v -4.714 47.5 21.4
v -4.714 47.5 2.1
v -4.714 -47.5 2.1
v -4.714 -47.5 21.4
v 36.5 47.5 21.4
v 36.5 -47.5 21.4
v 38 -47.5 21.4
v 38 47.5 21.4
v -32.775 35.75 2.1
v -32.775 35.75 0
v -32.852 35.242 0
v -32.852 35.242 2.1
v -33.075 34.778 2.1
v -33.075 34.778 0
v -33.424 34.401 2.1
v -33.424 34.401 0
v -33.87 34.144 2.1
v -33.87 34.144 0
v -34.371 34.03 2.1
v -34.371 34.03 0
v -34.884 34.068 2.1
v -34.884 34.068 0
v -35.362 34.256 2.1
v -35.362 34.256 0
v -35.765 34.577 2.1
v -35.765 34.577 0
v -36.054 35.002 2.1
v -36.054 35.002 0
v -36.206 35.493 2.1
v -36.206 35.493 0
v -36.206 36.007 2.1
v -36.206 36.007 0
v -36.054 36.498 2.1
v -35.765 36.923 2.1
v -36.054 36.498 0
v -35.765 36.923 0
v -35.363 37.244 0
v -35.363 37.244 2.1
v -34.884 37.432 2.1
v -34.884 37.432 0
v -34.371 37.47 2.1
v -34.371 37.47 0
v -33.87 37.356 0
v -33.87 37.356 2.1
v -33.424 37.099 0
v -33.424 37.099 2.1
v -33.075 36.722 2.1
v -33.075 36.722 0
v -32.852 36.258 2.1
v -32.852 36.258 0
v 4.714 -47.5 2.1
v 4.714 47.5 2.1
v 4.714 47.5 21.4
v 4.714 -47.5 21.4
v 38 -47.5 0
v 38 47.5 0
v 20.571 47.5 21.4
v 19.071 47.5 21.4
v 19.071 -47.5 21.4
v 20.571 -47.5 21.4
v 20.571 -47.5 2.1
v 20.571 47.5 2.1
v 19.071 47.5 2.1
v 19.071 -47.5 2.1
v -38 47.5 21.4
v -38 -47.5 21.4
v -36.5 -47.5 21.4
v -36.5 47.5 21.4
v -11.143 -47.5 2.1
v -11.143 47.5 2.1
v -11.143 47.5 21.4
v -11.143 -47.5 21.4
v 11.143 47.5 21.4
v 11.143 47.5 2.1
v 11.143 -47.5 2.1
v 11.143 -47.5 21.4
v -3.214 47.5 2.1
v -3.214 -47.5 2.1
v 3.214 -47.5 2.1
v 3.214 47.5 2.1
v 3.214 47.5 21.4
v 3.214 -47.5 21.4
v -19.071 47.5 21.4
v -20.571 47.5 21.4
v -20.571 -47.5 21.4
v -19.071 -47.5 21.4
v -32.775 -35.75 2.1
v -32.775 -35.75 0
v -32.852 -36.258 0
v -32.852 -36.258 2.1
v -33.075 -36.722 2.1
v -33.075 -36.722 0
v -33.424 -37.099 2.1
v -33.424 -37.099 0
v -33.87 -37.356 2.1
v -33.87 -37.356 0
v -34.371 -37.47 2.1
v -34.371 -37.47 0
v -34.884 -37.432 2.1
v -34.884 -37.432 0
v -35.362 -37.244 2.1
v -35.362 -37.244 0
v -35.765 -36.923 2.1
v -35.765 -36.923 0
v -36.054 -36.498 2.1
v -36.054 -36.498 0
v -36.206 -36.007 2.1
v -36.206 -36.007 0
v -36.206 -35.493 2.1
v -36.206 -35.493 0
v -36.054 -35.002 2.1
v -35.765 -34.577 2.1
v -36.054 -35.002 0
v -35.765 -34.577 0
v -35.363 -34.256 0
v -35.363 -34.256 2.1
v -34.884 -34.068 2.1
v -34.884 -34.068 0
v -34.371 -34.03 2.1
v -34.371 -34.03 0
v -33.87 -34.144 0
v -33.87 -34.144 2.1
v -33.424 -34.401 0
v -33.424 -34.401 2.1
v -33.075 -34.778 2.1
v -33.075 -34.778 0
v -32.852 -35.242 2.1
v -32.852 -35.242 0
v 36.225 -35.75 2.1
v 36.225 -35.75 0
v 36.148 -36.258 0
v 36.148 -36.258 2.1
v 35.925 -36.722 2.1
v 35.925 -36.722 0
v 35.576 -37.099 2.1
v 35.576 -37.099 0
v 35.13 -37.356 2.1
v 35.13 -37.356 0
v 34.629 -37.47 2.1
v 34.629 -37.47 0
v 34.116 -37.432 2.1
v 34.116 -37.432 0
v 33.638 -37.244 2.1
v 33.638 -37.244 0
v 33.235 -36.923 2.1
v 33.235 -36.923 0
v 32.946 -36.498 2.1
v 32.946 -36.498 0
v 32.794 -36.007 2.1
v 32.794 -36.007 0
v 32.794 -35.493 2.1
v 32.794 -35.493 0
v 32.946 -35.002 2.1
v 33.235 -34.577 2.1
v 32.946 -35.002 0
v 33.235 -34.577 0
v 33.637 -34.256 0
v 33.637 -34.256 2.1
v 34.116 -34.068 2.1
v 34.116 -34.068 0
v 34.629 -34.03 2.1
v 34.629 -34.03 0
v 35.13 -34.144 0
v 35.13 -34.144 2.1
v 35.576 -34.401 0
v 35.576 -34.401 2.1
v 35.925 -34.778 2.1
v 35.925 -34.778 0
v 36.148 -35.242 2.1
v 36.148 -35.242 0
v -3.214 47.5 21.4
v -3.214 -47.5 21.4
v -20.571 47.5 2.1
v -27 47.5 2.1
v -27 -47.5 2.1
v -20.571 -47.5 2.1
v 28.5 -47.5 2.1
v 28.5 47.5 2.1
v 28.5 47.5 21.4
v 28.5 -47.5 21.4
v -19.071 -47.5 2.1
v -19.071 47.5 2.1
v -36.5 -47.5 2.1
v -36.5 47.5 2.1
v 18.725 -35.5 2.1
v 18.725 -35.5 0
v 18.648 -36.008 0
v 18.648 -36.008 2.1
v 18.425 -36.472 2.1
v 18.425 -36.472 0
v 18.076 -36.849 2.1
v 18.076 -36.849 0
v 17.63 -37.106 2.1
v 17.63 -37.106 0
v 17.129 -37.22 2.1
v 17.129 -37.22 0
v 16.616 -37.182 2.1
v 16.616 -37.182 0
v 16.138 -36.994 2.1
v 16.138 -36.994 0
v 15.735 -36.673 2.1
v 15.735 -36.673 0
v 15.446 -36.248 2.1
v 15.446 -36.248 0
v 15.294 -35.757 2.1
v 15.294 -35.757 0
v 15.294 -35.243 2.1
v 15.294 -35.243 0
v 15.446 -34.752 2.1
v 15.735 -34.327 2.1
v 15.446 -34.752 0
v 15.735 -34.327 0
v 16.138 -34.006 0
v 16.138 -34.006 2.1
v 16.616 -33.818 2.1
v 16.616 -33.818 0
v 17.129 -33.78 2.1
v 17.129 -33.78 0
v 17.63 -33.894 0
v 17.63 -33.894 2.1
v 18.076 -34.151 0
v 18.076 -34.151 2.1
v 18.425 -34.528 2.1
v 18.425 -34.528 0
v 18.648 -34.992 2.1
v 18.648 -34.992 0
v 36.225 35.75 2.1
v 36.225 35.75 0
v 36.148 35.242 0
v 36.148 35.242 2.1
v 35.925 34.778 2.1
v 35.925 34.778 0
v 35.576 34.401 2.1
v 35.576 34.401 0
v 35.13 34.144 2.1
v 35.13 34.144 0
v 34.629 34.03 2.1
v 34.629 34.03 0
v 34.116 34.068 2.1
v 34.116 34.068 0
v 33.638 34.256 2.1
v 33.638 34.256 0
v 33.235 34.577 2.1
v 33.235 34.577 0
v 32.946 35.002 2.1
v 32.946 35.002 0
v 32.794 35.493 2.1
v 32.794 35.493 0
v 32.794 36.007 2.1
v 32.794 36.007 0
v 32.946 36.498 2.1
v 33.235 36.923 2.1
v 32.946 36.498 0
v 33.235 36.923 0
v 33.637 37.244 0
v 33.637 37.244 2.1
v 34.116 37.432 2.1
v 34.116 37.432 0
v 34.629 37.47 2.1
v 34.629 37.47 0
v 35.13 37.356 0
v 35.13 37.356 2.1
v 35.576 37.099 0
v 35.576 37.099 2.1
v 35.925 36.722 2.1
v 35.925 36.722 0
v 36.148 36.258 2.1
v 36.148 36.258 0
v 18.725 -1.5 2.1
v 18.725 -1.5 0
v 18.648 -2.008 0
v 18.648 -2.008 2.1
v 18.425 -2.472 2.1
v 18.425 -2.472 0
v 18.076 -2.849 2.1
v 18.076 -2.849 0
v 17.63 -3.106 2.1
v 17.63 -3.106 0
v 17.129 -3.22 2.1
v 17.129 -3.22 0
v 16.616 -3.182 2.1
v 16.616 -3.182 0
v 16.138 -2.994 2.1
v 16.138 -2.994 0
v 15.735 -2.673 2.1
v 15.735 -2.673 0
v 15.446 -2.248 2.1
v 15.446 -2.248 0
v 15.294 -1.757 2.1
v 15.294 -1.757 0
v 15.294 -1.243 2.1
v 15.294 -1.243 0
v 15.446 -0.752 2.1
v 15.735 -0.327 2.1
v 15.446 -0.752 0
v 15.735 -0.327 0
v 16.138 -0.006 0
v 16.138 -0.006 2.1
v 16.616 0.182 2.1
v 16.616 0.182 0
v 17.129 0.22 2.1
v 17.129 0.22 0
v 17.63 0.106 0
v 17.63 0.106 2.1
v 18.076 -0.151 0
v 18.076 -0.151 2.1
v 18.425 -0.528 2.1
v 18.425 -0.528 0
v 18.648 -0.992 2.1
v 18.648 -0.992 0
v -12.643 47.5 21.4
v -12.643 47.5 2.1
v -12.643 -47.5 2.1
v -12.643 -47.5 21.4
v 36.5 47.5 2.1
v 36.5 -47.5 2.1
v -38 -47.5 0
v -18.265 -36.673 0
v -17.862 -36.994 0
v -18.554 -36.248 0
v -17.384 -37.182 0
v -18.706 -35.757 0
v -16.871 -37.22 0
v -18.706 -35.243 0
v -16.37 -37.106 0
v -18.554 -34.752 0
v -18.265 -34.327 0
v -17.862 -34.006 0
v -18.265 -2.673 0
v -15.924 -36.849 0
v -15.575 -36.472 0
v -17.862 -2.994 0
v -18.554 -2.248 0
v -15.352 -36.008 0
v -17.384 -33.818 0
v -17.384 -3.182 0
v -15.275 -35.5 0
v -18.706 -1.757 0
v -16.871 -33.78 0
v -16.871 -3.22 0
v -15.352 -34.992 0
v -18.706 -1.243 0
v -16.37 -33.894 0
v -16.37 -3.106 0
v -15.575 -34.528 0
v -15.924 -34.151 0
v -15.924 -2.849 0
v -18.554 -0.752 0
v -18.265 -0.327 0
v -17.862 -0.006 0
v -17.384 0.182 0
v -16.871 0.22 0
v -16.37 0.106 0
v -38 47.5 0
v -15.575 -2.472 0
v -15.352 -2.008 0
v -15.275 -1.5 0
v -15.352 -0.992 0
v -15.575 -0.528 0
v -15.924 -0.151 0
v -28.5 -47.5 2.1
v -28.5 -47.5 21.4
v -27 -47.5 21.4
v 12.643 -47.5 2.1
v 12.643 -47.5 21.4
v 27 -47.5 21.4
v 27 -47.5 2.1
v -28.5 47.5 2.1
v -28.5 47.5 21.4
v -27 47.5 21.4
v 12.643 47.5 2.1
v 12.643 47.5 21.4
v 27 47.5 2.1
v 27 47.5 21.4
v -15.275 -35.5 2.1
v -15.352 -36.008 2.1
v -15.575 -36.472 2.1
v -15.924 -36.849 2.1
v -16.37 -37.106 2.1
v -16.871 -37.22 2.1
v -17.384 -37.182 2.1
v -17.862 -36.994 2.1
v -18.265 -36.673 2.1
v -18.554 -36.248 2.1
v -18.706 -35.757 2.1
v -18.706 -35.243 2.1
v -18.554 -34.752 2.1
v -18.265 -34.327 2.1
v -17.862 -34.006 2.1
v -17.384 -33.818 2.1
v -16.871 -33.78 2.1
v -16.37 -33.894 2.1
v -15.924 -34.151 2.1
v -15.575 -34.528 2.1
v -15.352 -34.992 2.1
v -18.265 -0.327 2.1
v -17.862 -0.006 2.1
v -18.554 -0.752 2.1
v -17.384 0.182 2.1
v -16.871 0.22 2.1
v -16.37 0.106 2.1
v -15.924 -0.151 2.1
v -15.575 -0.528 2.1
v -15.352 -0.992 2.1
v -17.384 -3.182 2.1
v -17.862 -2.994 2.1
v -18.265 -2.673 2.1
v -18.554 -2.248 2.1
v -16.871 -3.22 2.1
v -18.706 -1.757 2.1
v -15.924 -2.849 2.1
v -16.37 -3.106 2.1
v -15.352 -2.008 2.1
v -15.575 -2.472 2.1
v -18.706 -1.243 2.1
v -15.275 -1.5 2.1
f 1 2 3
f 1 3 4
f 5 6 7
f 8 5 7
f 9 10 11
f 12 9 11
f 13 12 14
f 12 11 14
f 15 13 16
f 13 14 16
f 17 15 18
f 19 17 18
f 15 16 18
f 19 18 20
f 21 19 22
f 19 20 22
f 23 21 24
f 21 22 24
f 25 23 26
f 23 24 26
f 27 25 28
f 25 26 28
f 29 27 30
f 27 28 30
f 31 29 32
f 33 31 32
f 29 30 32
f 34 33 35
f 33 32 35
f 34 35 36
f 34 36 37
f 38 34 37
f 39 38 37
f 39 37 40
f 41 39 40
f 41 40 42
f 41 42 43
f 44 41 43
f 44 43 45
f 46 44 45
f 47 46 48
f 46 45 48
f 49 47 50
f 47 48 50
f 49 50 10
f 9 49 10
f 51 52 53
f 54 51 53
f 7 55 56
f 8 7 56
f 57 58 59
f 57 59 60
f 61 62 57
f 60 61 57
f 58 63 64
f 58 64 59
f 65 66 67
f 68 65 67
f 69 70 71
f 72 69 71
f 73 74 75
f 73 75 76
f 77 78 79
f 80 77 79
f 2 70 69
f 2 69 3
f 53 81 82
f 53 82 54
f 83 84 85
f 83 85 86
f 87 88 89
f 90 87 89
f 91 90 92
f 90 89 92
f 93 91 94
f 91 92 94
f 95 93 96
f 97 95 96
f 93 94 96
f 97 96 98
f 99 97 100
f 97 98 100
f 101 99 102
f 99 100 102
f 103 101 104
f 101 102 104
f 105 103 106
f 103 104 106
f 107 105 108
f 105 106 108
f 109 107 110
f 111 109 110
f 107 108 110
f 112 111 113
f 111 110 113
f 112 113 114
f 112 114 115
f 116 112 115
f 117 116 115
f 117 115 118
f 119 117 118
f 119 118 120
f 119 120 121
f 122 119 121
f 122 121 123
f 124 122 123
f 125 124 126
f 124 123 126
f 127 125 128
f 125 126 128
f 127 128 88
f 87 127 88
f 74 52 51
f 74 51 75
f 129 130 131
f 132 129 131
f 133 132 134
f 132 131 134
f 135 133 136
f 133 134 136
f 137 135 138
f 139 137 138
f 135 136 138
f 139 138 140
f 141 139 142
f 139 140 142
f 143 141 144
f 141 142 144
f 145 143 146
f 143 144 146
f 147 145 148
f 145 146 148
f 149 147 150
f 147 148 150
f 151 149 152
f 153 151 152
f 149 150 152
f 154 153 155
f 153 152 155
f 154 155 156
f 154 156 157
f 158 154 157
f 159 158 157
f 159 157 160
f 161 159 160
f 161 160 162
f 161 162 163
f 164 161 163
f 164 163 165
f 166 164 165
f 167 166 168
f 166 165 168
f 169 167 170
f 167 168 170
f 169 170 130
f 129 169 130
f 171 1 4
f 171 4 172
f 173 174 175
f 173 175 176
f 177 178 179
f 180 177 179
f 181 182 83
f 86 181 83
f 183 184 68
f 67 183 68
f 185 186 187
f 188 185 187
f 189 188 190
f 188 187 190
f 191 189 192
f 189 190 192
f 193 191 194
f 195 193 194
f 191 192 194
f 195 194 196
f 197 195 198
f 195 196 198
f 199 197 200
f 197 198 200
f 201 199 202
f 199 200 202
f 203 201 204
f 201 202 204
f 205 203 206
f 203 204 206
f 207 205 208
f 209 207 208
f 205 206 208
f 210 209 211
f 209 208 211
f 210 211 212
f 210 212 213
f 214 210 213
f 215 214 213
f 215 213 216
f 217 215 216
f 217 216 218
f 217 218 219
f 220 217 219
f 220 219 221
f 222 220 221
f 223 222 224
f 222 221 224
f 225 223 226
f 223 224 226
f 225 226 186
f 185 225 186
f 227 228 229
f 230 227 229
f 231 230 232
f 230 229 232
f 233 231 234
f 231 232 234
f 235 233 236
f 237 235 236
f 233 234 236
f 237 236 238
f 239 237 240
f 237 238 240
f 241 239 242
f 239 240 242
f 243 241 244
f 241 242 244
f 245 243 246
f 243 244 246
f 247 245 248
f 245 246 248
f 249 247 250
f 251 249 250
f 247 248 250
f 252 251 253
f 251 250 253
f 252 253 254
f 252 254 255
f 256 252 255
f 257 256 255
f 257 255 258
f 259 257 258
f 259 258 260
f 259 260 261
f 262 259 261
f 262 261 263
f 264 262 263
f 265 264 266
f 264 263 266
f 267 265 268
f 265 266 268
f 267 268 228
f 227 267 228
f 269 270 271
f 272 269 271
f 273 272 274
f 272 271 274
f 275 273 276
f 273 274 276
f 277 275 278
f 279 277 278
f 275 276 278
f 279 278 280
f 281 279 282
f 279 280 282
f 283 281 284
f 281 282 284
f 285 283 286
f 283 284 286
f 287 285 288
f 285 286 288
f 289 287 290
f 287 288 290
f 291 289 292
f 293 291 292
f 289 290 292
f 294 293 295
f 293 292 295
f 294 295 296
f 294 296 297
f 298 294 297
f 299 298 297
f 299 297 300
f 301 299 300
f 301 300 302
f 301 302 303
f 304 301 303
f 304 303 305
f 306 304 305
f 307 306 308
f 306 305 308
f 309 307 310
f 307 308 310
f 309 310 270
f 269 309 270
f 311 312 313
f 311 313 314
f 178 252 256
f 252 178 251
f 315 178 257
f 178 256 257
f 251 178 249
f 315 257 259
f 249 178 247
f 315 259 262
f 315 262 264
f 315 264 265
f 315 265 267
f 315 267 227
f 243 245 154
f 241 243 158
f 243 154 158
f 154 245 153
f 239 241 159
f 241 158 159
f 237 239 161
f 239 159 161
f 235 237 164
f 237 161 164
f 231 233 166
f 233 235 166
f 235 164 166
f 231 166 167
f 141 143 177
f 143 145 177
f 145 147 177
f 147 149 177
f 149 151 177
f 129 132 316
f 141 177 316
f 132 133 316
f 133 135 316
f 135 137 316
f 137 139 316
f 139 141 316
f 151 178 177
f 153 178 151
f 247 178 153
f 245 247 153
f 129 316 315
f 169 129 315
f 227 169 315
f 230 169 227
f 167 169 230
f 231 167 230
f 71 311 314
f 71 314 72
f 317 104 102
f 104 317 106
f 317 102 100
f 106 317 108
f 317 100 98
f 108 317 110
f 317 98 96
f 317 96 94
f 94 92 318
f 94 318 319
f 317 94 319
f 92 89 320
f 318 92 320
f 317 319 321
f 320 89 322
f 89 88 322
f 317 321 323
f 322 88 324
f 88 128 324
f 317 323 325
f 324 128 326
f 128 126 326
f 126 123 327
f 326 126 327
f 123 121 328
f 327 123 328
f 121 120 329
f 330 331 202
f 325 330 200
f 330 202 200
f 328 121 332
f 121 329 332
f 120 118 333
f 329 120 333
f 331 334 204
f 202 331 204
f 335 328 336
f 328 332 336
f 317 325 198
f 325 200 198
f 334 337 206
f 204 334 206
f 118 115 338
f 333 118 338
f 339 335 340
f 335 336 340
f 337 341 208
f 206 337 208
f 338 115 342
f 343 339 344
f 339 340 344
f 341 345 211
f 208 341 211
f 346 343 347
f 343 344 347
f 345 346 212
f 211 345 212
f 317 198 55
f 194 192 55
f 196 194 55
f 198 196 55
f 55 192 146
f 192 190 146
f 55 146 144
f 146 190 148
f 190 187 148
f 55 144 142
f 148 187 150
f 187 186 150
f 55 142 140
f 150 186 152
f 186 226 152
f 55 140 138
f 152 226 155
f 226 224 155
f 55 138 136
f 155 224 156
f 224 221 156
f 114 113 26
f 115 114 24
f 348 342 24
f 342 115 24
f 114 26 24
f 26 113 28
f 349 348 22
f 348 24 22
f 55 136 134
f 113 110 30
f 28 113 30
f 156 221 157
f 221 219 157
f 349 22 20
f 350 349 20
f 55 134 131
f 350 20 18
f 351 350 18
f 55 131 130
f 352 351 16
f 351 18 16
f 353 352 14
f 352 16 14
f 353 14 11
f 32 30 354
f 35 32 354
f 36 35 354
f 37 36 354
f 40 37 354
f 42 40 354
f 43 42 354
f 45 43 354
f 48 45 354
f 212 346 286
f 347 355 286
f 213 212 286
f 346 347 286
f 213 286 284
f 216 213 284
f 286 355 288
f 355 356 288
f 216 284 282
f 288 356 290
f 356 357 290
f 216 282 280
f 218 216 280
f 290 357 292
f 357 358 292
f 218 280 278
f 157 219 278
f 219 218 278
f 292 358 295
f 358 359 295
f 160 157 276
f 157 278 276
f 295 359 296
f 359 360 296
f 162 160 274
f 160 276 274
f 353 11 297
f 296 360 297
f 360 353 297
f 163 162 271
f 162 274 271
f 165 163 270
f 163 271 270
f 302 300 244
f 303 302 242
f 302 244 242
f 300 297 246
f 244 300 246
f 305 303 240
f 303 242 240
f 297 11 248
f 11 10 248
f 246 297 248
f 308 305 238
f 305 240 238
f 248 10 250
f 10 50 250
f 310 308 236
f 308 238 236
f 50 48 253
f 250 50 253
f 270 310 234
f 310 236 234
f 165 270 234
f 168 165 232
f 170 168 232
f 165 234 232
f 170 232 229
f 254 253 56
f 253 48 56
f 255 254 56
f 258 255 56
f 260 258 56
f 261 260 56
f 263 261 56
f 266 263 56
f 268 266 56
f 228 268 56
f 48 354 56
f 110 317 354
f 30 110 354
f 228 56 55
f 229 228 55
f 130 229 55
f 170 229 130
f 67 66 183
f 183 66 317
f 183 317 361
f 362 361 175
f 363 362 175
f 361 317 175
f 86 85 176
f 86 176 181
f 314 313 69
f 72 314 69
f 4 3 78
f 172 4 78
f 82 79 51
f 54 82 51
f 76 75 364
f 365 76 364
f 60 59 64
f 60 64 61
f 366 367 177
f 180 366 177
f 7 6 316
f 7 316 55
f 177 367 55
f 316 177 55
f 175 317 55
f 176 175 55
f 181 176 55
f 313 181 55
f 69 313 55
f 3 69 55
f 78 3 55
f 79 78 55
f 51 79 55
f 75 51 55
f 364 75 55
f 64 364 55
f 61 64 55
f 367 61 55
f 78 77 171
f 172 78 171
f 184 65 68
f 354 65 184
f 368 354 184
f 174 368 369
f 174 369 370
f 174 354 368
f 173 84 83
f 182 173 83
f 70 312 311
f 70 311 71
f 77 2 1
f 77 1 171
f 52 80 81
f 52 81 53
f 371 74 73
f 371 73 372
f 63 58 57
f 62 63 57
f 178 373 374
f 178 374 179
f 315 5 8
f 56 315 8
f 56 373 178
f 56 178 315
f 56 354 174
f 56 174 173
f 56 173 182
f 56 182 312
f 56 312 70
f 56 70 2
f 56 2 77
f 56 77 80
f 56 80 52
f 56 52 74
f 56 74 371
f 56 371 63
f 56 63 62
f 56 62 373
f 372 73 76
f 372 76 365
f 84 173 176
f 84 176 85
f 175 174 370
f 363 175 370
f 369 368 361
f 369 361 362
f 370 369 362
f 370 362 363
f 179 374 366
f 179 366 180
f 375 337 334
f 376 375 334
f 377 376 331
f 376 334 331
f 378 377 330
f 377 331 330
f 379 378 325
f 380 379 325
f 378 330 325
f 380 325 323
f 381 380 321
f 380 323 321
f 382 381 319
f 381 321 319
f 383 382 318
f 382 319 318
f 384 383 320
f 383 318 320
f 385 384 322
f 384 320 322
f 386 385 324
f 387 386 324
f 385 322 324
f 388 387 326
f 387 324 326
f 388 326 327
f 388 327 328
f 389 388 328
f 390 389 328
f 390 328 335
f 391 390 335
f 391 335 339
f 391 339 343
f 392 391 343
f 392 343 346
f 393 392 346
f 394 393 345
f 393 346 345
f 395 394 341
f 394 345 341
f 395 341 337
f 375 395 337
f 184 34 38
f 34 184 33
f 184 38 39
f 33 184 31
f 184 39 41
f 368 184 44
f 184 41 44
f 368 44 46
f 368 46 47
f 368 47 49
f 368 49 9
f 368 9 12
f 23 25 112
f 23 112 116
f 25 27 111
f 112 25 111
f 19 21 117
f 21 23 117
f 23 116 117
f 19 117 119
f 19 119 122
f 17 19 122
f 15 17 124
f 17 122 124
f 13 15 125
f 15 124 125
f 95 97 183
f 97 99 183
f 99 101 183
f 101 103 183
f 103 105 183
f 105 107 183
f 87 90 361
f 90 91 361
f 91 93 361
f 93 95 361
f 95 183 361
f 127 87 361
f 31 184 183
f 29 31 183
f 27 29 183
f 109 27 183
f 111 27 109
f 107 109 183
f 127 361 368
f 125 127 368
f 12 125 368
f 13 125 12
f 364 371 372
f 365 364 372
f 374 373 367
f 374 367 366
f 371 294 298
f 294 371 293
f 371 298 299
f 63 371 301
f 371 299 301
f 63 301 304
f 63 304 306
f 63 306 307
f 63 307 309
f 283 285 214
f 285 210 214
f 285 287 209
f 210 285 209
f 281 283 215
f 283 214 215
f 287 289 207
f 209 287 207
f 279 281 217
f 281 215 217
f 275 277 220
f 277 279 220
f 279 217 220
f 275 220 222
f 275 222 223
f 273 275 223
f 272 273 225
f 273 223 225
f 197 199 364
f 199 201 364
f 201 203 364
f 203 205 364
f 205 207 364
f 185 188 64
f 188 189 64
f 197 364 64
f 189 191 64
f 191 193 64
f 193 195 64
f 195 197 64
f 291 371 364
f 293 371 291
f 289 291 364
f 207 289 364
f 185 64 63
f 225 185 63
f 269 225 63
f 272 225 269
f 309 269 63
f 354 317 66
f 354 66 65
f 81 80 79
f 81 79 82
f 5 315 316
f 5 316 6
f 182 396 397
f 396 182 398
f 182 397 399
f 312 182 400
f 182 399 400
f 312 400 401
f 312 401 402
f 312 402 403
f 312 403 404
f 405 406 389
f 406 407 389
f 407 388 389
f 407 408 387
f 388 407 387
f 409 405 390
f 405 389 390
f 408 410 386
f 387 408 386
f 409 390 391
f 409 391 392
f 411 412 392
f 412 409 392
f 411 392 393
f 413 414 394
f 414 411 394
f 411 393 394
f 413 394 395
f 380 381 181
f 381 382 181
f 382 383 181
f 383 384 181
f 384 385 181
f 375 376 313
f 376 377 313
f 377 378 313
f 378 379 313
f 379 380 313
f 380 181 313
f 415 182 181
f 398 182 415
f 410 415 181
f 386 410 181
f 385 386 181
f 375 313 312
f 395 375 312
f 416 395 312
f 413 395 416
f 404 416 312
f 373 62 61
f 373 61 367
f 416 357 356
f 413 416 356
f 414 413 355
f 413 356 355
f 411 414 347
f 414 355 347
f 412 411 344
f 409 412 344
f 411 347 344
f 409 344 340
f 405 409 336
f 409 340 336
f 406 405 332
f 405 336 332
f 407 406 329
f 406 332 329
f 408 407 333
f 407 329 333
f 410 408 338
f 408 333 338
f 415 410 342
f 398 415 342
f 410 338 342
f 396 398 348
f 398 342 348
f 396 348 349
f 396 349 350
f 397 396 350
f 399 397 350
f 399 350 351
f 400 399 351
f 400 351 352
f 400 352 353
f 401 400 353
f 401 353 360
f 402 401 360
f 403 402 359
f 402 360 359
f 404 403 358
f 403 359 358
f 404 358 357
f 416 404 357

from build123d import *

# Parameters (mm, degrees)
F0_W     = 76
F0_H     = 95
F1_DEPTH = 21.4
F2_W     = 8
F2_H     = 19.3
F2_W_2   = 6.428571
F2_W_3   = 6.428572
F3_DEPTH = 95
F4_R     = 1.725
F5_DEPTH = 2.1


with BuildPart() as f1:
    # F0 (on Top) → F1 (new body)
    with BuildSketch(Plane.XY):
        Rectangle(F0_W, F0_H)
    extrude(amount=F1_DEPTH)

    # F2 (on face) → F3 (cut, through all)
    with BuildSketch(Plane.XZ.offset(47.5)):
        with Locations((-32.5, 11.75)):
            Rectangle(F2_W, F2_H)
        with Locations((32.5, 11.75)):
            Rectangle(F2_W, F2_H)
        with Locations((-23.785714, 11.75)):
            Rectangle(F2_W_2, F2_H)
        with Locations((-15.857143, 11.75)):
            Rectangle(F2_W_3, F2_H)
        with Locations((-7.928571, 11.75)):
            Rectangle(F2_W_2, F2_H)
        with Locations((0, 11.75)):
            Rectangle(F2_W_3, F2_H)
        with Locations((7.928571, 11.75)):
            Rectangle(F2_W_2, F2_H)
        with Locations((15.857143, 11.75)):
            Rectangle(F2_W_3, F2_H)
        with Locations((23.785714, 11.75)):
            Rectangle(F2_W_2, F2_H)
    extrude(amount=-F3_DEPTH, mode=Mode.SUBTRACT)

    # F4 (on face) → F5 (cut, through all)
    with BuildSketch(Plane(origin=(0, 0, 0), x_dir=(1, 0, 0), z_dir=(0, 0, -1))):
        with Locations((-17, 35.5)):
            Circle(F4_R)
        with Locations((17, 35.5)):
            Circle(F4_R)
        with Locations((17, 1.5)):
            Circle(F4_R)
        with Locations((-17, 1.5)):
            Circle(F4_R)
        with Locations((-34.5, 35.75)):
            Circle(F4_R)
        with Locations((34.5, 35.75)):
            Circle(F4_R)
        with Locations((34.5, -35.75)):
            Circle(F4_R)
        with Locations((-34.5, -35.75)):
            Circle(F4_R)
    extrude(amount=-F5_DEPTH, mode=Mode.SUBTRACT)


solid = f1.part
